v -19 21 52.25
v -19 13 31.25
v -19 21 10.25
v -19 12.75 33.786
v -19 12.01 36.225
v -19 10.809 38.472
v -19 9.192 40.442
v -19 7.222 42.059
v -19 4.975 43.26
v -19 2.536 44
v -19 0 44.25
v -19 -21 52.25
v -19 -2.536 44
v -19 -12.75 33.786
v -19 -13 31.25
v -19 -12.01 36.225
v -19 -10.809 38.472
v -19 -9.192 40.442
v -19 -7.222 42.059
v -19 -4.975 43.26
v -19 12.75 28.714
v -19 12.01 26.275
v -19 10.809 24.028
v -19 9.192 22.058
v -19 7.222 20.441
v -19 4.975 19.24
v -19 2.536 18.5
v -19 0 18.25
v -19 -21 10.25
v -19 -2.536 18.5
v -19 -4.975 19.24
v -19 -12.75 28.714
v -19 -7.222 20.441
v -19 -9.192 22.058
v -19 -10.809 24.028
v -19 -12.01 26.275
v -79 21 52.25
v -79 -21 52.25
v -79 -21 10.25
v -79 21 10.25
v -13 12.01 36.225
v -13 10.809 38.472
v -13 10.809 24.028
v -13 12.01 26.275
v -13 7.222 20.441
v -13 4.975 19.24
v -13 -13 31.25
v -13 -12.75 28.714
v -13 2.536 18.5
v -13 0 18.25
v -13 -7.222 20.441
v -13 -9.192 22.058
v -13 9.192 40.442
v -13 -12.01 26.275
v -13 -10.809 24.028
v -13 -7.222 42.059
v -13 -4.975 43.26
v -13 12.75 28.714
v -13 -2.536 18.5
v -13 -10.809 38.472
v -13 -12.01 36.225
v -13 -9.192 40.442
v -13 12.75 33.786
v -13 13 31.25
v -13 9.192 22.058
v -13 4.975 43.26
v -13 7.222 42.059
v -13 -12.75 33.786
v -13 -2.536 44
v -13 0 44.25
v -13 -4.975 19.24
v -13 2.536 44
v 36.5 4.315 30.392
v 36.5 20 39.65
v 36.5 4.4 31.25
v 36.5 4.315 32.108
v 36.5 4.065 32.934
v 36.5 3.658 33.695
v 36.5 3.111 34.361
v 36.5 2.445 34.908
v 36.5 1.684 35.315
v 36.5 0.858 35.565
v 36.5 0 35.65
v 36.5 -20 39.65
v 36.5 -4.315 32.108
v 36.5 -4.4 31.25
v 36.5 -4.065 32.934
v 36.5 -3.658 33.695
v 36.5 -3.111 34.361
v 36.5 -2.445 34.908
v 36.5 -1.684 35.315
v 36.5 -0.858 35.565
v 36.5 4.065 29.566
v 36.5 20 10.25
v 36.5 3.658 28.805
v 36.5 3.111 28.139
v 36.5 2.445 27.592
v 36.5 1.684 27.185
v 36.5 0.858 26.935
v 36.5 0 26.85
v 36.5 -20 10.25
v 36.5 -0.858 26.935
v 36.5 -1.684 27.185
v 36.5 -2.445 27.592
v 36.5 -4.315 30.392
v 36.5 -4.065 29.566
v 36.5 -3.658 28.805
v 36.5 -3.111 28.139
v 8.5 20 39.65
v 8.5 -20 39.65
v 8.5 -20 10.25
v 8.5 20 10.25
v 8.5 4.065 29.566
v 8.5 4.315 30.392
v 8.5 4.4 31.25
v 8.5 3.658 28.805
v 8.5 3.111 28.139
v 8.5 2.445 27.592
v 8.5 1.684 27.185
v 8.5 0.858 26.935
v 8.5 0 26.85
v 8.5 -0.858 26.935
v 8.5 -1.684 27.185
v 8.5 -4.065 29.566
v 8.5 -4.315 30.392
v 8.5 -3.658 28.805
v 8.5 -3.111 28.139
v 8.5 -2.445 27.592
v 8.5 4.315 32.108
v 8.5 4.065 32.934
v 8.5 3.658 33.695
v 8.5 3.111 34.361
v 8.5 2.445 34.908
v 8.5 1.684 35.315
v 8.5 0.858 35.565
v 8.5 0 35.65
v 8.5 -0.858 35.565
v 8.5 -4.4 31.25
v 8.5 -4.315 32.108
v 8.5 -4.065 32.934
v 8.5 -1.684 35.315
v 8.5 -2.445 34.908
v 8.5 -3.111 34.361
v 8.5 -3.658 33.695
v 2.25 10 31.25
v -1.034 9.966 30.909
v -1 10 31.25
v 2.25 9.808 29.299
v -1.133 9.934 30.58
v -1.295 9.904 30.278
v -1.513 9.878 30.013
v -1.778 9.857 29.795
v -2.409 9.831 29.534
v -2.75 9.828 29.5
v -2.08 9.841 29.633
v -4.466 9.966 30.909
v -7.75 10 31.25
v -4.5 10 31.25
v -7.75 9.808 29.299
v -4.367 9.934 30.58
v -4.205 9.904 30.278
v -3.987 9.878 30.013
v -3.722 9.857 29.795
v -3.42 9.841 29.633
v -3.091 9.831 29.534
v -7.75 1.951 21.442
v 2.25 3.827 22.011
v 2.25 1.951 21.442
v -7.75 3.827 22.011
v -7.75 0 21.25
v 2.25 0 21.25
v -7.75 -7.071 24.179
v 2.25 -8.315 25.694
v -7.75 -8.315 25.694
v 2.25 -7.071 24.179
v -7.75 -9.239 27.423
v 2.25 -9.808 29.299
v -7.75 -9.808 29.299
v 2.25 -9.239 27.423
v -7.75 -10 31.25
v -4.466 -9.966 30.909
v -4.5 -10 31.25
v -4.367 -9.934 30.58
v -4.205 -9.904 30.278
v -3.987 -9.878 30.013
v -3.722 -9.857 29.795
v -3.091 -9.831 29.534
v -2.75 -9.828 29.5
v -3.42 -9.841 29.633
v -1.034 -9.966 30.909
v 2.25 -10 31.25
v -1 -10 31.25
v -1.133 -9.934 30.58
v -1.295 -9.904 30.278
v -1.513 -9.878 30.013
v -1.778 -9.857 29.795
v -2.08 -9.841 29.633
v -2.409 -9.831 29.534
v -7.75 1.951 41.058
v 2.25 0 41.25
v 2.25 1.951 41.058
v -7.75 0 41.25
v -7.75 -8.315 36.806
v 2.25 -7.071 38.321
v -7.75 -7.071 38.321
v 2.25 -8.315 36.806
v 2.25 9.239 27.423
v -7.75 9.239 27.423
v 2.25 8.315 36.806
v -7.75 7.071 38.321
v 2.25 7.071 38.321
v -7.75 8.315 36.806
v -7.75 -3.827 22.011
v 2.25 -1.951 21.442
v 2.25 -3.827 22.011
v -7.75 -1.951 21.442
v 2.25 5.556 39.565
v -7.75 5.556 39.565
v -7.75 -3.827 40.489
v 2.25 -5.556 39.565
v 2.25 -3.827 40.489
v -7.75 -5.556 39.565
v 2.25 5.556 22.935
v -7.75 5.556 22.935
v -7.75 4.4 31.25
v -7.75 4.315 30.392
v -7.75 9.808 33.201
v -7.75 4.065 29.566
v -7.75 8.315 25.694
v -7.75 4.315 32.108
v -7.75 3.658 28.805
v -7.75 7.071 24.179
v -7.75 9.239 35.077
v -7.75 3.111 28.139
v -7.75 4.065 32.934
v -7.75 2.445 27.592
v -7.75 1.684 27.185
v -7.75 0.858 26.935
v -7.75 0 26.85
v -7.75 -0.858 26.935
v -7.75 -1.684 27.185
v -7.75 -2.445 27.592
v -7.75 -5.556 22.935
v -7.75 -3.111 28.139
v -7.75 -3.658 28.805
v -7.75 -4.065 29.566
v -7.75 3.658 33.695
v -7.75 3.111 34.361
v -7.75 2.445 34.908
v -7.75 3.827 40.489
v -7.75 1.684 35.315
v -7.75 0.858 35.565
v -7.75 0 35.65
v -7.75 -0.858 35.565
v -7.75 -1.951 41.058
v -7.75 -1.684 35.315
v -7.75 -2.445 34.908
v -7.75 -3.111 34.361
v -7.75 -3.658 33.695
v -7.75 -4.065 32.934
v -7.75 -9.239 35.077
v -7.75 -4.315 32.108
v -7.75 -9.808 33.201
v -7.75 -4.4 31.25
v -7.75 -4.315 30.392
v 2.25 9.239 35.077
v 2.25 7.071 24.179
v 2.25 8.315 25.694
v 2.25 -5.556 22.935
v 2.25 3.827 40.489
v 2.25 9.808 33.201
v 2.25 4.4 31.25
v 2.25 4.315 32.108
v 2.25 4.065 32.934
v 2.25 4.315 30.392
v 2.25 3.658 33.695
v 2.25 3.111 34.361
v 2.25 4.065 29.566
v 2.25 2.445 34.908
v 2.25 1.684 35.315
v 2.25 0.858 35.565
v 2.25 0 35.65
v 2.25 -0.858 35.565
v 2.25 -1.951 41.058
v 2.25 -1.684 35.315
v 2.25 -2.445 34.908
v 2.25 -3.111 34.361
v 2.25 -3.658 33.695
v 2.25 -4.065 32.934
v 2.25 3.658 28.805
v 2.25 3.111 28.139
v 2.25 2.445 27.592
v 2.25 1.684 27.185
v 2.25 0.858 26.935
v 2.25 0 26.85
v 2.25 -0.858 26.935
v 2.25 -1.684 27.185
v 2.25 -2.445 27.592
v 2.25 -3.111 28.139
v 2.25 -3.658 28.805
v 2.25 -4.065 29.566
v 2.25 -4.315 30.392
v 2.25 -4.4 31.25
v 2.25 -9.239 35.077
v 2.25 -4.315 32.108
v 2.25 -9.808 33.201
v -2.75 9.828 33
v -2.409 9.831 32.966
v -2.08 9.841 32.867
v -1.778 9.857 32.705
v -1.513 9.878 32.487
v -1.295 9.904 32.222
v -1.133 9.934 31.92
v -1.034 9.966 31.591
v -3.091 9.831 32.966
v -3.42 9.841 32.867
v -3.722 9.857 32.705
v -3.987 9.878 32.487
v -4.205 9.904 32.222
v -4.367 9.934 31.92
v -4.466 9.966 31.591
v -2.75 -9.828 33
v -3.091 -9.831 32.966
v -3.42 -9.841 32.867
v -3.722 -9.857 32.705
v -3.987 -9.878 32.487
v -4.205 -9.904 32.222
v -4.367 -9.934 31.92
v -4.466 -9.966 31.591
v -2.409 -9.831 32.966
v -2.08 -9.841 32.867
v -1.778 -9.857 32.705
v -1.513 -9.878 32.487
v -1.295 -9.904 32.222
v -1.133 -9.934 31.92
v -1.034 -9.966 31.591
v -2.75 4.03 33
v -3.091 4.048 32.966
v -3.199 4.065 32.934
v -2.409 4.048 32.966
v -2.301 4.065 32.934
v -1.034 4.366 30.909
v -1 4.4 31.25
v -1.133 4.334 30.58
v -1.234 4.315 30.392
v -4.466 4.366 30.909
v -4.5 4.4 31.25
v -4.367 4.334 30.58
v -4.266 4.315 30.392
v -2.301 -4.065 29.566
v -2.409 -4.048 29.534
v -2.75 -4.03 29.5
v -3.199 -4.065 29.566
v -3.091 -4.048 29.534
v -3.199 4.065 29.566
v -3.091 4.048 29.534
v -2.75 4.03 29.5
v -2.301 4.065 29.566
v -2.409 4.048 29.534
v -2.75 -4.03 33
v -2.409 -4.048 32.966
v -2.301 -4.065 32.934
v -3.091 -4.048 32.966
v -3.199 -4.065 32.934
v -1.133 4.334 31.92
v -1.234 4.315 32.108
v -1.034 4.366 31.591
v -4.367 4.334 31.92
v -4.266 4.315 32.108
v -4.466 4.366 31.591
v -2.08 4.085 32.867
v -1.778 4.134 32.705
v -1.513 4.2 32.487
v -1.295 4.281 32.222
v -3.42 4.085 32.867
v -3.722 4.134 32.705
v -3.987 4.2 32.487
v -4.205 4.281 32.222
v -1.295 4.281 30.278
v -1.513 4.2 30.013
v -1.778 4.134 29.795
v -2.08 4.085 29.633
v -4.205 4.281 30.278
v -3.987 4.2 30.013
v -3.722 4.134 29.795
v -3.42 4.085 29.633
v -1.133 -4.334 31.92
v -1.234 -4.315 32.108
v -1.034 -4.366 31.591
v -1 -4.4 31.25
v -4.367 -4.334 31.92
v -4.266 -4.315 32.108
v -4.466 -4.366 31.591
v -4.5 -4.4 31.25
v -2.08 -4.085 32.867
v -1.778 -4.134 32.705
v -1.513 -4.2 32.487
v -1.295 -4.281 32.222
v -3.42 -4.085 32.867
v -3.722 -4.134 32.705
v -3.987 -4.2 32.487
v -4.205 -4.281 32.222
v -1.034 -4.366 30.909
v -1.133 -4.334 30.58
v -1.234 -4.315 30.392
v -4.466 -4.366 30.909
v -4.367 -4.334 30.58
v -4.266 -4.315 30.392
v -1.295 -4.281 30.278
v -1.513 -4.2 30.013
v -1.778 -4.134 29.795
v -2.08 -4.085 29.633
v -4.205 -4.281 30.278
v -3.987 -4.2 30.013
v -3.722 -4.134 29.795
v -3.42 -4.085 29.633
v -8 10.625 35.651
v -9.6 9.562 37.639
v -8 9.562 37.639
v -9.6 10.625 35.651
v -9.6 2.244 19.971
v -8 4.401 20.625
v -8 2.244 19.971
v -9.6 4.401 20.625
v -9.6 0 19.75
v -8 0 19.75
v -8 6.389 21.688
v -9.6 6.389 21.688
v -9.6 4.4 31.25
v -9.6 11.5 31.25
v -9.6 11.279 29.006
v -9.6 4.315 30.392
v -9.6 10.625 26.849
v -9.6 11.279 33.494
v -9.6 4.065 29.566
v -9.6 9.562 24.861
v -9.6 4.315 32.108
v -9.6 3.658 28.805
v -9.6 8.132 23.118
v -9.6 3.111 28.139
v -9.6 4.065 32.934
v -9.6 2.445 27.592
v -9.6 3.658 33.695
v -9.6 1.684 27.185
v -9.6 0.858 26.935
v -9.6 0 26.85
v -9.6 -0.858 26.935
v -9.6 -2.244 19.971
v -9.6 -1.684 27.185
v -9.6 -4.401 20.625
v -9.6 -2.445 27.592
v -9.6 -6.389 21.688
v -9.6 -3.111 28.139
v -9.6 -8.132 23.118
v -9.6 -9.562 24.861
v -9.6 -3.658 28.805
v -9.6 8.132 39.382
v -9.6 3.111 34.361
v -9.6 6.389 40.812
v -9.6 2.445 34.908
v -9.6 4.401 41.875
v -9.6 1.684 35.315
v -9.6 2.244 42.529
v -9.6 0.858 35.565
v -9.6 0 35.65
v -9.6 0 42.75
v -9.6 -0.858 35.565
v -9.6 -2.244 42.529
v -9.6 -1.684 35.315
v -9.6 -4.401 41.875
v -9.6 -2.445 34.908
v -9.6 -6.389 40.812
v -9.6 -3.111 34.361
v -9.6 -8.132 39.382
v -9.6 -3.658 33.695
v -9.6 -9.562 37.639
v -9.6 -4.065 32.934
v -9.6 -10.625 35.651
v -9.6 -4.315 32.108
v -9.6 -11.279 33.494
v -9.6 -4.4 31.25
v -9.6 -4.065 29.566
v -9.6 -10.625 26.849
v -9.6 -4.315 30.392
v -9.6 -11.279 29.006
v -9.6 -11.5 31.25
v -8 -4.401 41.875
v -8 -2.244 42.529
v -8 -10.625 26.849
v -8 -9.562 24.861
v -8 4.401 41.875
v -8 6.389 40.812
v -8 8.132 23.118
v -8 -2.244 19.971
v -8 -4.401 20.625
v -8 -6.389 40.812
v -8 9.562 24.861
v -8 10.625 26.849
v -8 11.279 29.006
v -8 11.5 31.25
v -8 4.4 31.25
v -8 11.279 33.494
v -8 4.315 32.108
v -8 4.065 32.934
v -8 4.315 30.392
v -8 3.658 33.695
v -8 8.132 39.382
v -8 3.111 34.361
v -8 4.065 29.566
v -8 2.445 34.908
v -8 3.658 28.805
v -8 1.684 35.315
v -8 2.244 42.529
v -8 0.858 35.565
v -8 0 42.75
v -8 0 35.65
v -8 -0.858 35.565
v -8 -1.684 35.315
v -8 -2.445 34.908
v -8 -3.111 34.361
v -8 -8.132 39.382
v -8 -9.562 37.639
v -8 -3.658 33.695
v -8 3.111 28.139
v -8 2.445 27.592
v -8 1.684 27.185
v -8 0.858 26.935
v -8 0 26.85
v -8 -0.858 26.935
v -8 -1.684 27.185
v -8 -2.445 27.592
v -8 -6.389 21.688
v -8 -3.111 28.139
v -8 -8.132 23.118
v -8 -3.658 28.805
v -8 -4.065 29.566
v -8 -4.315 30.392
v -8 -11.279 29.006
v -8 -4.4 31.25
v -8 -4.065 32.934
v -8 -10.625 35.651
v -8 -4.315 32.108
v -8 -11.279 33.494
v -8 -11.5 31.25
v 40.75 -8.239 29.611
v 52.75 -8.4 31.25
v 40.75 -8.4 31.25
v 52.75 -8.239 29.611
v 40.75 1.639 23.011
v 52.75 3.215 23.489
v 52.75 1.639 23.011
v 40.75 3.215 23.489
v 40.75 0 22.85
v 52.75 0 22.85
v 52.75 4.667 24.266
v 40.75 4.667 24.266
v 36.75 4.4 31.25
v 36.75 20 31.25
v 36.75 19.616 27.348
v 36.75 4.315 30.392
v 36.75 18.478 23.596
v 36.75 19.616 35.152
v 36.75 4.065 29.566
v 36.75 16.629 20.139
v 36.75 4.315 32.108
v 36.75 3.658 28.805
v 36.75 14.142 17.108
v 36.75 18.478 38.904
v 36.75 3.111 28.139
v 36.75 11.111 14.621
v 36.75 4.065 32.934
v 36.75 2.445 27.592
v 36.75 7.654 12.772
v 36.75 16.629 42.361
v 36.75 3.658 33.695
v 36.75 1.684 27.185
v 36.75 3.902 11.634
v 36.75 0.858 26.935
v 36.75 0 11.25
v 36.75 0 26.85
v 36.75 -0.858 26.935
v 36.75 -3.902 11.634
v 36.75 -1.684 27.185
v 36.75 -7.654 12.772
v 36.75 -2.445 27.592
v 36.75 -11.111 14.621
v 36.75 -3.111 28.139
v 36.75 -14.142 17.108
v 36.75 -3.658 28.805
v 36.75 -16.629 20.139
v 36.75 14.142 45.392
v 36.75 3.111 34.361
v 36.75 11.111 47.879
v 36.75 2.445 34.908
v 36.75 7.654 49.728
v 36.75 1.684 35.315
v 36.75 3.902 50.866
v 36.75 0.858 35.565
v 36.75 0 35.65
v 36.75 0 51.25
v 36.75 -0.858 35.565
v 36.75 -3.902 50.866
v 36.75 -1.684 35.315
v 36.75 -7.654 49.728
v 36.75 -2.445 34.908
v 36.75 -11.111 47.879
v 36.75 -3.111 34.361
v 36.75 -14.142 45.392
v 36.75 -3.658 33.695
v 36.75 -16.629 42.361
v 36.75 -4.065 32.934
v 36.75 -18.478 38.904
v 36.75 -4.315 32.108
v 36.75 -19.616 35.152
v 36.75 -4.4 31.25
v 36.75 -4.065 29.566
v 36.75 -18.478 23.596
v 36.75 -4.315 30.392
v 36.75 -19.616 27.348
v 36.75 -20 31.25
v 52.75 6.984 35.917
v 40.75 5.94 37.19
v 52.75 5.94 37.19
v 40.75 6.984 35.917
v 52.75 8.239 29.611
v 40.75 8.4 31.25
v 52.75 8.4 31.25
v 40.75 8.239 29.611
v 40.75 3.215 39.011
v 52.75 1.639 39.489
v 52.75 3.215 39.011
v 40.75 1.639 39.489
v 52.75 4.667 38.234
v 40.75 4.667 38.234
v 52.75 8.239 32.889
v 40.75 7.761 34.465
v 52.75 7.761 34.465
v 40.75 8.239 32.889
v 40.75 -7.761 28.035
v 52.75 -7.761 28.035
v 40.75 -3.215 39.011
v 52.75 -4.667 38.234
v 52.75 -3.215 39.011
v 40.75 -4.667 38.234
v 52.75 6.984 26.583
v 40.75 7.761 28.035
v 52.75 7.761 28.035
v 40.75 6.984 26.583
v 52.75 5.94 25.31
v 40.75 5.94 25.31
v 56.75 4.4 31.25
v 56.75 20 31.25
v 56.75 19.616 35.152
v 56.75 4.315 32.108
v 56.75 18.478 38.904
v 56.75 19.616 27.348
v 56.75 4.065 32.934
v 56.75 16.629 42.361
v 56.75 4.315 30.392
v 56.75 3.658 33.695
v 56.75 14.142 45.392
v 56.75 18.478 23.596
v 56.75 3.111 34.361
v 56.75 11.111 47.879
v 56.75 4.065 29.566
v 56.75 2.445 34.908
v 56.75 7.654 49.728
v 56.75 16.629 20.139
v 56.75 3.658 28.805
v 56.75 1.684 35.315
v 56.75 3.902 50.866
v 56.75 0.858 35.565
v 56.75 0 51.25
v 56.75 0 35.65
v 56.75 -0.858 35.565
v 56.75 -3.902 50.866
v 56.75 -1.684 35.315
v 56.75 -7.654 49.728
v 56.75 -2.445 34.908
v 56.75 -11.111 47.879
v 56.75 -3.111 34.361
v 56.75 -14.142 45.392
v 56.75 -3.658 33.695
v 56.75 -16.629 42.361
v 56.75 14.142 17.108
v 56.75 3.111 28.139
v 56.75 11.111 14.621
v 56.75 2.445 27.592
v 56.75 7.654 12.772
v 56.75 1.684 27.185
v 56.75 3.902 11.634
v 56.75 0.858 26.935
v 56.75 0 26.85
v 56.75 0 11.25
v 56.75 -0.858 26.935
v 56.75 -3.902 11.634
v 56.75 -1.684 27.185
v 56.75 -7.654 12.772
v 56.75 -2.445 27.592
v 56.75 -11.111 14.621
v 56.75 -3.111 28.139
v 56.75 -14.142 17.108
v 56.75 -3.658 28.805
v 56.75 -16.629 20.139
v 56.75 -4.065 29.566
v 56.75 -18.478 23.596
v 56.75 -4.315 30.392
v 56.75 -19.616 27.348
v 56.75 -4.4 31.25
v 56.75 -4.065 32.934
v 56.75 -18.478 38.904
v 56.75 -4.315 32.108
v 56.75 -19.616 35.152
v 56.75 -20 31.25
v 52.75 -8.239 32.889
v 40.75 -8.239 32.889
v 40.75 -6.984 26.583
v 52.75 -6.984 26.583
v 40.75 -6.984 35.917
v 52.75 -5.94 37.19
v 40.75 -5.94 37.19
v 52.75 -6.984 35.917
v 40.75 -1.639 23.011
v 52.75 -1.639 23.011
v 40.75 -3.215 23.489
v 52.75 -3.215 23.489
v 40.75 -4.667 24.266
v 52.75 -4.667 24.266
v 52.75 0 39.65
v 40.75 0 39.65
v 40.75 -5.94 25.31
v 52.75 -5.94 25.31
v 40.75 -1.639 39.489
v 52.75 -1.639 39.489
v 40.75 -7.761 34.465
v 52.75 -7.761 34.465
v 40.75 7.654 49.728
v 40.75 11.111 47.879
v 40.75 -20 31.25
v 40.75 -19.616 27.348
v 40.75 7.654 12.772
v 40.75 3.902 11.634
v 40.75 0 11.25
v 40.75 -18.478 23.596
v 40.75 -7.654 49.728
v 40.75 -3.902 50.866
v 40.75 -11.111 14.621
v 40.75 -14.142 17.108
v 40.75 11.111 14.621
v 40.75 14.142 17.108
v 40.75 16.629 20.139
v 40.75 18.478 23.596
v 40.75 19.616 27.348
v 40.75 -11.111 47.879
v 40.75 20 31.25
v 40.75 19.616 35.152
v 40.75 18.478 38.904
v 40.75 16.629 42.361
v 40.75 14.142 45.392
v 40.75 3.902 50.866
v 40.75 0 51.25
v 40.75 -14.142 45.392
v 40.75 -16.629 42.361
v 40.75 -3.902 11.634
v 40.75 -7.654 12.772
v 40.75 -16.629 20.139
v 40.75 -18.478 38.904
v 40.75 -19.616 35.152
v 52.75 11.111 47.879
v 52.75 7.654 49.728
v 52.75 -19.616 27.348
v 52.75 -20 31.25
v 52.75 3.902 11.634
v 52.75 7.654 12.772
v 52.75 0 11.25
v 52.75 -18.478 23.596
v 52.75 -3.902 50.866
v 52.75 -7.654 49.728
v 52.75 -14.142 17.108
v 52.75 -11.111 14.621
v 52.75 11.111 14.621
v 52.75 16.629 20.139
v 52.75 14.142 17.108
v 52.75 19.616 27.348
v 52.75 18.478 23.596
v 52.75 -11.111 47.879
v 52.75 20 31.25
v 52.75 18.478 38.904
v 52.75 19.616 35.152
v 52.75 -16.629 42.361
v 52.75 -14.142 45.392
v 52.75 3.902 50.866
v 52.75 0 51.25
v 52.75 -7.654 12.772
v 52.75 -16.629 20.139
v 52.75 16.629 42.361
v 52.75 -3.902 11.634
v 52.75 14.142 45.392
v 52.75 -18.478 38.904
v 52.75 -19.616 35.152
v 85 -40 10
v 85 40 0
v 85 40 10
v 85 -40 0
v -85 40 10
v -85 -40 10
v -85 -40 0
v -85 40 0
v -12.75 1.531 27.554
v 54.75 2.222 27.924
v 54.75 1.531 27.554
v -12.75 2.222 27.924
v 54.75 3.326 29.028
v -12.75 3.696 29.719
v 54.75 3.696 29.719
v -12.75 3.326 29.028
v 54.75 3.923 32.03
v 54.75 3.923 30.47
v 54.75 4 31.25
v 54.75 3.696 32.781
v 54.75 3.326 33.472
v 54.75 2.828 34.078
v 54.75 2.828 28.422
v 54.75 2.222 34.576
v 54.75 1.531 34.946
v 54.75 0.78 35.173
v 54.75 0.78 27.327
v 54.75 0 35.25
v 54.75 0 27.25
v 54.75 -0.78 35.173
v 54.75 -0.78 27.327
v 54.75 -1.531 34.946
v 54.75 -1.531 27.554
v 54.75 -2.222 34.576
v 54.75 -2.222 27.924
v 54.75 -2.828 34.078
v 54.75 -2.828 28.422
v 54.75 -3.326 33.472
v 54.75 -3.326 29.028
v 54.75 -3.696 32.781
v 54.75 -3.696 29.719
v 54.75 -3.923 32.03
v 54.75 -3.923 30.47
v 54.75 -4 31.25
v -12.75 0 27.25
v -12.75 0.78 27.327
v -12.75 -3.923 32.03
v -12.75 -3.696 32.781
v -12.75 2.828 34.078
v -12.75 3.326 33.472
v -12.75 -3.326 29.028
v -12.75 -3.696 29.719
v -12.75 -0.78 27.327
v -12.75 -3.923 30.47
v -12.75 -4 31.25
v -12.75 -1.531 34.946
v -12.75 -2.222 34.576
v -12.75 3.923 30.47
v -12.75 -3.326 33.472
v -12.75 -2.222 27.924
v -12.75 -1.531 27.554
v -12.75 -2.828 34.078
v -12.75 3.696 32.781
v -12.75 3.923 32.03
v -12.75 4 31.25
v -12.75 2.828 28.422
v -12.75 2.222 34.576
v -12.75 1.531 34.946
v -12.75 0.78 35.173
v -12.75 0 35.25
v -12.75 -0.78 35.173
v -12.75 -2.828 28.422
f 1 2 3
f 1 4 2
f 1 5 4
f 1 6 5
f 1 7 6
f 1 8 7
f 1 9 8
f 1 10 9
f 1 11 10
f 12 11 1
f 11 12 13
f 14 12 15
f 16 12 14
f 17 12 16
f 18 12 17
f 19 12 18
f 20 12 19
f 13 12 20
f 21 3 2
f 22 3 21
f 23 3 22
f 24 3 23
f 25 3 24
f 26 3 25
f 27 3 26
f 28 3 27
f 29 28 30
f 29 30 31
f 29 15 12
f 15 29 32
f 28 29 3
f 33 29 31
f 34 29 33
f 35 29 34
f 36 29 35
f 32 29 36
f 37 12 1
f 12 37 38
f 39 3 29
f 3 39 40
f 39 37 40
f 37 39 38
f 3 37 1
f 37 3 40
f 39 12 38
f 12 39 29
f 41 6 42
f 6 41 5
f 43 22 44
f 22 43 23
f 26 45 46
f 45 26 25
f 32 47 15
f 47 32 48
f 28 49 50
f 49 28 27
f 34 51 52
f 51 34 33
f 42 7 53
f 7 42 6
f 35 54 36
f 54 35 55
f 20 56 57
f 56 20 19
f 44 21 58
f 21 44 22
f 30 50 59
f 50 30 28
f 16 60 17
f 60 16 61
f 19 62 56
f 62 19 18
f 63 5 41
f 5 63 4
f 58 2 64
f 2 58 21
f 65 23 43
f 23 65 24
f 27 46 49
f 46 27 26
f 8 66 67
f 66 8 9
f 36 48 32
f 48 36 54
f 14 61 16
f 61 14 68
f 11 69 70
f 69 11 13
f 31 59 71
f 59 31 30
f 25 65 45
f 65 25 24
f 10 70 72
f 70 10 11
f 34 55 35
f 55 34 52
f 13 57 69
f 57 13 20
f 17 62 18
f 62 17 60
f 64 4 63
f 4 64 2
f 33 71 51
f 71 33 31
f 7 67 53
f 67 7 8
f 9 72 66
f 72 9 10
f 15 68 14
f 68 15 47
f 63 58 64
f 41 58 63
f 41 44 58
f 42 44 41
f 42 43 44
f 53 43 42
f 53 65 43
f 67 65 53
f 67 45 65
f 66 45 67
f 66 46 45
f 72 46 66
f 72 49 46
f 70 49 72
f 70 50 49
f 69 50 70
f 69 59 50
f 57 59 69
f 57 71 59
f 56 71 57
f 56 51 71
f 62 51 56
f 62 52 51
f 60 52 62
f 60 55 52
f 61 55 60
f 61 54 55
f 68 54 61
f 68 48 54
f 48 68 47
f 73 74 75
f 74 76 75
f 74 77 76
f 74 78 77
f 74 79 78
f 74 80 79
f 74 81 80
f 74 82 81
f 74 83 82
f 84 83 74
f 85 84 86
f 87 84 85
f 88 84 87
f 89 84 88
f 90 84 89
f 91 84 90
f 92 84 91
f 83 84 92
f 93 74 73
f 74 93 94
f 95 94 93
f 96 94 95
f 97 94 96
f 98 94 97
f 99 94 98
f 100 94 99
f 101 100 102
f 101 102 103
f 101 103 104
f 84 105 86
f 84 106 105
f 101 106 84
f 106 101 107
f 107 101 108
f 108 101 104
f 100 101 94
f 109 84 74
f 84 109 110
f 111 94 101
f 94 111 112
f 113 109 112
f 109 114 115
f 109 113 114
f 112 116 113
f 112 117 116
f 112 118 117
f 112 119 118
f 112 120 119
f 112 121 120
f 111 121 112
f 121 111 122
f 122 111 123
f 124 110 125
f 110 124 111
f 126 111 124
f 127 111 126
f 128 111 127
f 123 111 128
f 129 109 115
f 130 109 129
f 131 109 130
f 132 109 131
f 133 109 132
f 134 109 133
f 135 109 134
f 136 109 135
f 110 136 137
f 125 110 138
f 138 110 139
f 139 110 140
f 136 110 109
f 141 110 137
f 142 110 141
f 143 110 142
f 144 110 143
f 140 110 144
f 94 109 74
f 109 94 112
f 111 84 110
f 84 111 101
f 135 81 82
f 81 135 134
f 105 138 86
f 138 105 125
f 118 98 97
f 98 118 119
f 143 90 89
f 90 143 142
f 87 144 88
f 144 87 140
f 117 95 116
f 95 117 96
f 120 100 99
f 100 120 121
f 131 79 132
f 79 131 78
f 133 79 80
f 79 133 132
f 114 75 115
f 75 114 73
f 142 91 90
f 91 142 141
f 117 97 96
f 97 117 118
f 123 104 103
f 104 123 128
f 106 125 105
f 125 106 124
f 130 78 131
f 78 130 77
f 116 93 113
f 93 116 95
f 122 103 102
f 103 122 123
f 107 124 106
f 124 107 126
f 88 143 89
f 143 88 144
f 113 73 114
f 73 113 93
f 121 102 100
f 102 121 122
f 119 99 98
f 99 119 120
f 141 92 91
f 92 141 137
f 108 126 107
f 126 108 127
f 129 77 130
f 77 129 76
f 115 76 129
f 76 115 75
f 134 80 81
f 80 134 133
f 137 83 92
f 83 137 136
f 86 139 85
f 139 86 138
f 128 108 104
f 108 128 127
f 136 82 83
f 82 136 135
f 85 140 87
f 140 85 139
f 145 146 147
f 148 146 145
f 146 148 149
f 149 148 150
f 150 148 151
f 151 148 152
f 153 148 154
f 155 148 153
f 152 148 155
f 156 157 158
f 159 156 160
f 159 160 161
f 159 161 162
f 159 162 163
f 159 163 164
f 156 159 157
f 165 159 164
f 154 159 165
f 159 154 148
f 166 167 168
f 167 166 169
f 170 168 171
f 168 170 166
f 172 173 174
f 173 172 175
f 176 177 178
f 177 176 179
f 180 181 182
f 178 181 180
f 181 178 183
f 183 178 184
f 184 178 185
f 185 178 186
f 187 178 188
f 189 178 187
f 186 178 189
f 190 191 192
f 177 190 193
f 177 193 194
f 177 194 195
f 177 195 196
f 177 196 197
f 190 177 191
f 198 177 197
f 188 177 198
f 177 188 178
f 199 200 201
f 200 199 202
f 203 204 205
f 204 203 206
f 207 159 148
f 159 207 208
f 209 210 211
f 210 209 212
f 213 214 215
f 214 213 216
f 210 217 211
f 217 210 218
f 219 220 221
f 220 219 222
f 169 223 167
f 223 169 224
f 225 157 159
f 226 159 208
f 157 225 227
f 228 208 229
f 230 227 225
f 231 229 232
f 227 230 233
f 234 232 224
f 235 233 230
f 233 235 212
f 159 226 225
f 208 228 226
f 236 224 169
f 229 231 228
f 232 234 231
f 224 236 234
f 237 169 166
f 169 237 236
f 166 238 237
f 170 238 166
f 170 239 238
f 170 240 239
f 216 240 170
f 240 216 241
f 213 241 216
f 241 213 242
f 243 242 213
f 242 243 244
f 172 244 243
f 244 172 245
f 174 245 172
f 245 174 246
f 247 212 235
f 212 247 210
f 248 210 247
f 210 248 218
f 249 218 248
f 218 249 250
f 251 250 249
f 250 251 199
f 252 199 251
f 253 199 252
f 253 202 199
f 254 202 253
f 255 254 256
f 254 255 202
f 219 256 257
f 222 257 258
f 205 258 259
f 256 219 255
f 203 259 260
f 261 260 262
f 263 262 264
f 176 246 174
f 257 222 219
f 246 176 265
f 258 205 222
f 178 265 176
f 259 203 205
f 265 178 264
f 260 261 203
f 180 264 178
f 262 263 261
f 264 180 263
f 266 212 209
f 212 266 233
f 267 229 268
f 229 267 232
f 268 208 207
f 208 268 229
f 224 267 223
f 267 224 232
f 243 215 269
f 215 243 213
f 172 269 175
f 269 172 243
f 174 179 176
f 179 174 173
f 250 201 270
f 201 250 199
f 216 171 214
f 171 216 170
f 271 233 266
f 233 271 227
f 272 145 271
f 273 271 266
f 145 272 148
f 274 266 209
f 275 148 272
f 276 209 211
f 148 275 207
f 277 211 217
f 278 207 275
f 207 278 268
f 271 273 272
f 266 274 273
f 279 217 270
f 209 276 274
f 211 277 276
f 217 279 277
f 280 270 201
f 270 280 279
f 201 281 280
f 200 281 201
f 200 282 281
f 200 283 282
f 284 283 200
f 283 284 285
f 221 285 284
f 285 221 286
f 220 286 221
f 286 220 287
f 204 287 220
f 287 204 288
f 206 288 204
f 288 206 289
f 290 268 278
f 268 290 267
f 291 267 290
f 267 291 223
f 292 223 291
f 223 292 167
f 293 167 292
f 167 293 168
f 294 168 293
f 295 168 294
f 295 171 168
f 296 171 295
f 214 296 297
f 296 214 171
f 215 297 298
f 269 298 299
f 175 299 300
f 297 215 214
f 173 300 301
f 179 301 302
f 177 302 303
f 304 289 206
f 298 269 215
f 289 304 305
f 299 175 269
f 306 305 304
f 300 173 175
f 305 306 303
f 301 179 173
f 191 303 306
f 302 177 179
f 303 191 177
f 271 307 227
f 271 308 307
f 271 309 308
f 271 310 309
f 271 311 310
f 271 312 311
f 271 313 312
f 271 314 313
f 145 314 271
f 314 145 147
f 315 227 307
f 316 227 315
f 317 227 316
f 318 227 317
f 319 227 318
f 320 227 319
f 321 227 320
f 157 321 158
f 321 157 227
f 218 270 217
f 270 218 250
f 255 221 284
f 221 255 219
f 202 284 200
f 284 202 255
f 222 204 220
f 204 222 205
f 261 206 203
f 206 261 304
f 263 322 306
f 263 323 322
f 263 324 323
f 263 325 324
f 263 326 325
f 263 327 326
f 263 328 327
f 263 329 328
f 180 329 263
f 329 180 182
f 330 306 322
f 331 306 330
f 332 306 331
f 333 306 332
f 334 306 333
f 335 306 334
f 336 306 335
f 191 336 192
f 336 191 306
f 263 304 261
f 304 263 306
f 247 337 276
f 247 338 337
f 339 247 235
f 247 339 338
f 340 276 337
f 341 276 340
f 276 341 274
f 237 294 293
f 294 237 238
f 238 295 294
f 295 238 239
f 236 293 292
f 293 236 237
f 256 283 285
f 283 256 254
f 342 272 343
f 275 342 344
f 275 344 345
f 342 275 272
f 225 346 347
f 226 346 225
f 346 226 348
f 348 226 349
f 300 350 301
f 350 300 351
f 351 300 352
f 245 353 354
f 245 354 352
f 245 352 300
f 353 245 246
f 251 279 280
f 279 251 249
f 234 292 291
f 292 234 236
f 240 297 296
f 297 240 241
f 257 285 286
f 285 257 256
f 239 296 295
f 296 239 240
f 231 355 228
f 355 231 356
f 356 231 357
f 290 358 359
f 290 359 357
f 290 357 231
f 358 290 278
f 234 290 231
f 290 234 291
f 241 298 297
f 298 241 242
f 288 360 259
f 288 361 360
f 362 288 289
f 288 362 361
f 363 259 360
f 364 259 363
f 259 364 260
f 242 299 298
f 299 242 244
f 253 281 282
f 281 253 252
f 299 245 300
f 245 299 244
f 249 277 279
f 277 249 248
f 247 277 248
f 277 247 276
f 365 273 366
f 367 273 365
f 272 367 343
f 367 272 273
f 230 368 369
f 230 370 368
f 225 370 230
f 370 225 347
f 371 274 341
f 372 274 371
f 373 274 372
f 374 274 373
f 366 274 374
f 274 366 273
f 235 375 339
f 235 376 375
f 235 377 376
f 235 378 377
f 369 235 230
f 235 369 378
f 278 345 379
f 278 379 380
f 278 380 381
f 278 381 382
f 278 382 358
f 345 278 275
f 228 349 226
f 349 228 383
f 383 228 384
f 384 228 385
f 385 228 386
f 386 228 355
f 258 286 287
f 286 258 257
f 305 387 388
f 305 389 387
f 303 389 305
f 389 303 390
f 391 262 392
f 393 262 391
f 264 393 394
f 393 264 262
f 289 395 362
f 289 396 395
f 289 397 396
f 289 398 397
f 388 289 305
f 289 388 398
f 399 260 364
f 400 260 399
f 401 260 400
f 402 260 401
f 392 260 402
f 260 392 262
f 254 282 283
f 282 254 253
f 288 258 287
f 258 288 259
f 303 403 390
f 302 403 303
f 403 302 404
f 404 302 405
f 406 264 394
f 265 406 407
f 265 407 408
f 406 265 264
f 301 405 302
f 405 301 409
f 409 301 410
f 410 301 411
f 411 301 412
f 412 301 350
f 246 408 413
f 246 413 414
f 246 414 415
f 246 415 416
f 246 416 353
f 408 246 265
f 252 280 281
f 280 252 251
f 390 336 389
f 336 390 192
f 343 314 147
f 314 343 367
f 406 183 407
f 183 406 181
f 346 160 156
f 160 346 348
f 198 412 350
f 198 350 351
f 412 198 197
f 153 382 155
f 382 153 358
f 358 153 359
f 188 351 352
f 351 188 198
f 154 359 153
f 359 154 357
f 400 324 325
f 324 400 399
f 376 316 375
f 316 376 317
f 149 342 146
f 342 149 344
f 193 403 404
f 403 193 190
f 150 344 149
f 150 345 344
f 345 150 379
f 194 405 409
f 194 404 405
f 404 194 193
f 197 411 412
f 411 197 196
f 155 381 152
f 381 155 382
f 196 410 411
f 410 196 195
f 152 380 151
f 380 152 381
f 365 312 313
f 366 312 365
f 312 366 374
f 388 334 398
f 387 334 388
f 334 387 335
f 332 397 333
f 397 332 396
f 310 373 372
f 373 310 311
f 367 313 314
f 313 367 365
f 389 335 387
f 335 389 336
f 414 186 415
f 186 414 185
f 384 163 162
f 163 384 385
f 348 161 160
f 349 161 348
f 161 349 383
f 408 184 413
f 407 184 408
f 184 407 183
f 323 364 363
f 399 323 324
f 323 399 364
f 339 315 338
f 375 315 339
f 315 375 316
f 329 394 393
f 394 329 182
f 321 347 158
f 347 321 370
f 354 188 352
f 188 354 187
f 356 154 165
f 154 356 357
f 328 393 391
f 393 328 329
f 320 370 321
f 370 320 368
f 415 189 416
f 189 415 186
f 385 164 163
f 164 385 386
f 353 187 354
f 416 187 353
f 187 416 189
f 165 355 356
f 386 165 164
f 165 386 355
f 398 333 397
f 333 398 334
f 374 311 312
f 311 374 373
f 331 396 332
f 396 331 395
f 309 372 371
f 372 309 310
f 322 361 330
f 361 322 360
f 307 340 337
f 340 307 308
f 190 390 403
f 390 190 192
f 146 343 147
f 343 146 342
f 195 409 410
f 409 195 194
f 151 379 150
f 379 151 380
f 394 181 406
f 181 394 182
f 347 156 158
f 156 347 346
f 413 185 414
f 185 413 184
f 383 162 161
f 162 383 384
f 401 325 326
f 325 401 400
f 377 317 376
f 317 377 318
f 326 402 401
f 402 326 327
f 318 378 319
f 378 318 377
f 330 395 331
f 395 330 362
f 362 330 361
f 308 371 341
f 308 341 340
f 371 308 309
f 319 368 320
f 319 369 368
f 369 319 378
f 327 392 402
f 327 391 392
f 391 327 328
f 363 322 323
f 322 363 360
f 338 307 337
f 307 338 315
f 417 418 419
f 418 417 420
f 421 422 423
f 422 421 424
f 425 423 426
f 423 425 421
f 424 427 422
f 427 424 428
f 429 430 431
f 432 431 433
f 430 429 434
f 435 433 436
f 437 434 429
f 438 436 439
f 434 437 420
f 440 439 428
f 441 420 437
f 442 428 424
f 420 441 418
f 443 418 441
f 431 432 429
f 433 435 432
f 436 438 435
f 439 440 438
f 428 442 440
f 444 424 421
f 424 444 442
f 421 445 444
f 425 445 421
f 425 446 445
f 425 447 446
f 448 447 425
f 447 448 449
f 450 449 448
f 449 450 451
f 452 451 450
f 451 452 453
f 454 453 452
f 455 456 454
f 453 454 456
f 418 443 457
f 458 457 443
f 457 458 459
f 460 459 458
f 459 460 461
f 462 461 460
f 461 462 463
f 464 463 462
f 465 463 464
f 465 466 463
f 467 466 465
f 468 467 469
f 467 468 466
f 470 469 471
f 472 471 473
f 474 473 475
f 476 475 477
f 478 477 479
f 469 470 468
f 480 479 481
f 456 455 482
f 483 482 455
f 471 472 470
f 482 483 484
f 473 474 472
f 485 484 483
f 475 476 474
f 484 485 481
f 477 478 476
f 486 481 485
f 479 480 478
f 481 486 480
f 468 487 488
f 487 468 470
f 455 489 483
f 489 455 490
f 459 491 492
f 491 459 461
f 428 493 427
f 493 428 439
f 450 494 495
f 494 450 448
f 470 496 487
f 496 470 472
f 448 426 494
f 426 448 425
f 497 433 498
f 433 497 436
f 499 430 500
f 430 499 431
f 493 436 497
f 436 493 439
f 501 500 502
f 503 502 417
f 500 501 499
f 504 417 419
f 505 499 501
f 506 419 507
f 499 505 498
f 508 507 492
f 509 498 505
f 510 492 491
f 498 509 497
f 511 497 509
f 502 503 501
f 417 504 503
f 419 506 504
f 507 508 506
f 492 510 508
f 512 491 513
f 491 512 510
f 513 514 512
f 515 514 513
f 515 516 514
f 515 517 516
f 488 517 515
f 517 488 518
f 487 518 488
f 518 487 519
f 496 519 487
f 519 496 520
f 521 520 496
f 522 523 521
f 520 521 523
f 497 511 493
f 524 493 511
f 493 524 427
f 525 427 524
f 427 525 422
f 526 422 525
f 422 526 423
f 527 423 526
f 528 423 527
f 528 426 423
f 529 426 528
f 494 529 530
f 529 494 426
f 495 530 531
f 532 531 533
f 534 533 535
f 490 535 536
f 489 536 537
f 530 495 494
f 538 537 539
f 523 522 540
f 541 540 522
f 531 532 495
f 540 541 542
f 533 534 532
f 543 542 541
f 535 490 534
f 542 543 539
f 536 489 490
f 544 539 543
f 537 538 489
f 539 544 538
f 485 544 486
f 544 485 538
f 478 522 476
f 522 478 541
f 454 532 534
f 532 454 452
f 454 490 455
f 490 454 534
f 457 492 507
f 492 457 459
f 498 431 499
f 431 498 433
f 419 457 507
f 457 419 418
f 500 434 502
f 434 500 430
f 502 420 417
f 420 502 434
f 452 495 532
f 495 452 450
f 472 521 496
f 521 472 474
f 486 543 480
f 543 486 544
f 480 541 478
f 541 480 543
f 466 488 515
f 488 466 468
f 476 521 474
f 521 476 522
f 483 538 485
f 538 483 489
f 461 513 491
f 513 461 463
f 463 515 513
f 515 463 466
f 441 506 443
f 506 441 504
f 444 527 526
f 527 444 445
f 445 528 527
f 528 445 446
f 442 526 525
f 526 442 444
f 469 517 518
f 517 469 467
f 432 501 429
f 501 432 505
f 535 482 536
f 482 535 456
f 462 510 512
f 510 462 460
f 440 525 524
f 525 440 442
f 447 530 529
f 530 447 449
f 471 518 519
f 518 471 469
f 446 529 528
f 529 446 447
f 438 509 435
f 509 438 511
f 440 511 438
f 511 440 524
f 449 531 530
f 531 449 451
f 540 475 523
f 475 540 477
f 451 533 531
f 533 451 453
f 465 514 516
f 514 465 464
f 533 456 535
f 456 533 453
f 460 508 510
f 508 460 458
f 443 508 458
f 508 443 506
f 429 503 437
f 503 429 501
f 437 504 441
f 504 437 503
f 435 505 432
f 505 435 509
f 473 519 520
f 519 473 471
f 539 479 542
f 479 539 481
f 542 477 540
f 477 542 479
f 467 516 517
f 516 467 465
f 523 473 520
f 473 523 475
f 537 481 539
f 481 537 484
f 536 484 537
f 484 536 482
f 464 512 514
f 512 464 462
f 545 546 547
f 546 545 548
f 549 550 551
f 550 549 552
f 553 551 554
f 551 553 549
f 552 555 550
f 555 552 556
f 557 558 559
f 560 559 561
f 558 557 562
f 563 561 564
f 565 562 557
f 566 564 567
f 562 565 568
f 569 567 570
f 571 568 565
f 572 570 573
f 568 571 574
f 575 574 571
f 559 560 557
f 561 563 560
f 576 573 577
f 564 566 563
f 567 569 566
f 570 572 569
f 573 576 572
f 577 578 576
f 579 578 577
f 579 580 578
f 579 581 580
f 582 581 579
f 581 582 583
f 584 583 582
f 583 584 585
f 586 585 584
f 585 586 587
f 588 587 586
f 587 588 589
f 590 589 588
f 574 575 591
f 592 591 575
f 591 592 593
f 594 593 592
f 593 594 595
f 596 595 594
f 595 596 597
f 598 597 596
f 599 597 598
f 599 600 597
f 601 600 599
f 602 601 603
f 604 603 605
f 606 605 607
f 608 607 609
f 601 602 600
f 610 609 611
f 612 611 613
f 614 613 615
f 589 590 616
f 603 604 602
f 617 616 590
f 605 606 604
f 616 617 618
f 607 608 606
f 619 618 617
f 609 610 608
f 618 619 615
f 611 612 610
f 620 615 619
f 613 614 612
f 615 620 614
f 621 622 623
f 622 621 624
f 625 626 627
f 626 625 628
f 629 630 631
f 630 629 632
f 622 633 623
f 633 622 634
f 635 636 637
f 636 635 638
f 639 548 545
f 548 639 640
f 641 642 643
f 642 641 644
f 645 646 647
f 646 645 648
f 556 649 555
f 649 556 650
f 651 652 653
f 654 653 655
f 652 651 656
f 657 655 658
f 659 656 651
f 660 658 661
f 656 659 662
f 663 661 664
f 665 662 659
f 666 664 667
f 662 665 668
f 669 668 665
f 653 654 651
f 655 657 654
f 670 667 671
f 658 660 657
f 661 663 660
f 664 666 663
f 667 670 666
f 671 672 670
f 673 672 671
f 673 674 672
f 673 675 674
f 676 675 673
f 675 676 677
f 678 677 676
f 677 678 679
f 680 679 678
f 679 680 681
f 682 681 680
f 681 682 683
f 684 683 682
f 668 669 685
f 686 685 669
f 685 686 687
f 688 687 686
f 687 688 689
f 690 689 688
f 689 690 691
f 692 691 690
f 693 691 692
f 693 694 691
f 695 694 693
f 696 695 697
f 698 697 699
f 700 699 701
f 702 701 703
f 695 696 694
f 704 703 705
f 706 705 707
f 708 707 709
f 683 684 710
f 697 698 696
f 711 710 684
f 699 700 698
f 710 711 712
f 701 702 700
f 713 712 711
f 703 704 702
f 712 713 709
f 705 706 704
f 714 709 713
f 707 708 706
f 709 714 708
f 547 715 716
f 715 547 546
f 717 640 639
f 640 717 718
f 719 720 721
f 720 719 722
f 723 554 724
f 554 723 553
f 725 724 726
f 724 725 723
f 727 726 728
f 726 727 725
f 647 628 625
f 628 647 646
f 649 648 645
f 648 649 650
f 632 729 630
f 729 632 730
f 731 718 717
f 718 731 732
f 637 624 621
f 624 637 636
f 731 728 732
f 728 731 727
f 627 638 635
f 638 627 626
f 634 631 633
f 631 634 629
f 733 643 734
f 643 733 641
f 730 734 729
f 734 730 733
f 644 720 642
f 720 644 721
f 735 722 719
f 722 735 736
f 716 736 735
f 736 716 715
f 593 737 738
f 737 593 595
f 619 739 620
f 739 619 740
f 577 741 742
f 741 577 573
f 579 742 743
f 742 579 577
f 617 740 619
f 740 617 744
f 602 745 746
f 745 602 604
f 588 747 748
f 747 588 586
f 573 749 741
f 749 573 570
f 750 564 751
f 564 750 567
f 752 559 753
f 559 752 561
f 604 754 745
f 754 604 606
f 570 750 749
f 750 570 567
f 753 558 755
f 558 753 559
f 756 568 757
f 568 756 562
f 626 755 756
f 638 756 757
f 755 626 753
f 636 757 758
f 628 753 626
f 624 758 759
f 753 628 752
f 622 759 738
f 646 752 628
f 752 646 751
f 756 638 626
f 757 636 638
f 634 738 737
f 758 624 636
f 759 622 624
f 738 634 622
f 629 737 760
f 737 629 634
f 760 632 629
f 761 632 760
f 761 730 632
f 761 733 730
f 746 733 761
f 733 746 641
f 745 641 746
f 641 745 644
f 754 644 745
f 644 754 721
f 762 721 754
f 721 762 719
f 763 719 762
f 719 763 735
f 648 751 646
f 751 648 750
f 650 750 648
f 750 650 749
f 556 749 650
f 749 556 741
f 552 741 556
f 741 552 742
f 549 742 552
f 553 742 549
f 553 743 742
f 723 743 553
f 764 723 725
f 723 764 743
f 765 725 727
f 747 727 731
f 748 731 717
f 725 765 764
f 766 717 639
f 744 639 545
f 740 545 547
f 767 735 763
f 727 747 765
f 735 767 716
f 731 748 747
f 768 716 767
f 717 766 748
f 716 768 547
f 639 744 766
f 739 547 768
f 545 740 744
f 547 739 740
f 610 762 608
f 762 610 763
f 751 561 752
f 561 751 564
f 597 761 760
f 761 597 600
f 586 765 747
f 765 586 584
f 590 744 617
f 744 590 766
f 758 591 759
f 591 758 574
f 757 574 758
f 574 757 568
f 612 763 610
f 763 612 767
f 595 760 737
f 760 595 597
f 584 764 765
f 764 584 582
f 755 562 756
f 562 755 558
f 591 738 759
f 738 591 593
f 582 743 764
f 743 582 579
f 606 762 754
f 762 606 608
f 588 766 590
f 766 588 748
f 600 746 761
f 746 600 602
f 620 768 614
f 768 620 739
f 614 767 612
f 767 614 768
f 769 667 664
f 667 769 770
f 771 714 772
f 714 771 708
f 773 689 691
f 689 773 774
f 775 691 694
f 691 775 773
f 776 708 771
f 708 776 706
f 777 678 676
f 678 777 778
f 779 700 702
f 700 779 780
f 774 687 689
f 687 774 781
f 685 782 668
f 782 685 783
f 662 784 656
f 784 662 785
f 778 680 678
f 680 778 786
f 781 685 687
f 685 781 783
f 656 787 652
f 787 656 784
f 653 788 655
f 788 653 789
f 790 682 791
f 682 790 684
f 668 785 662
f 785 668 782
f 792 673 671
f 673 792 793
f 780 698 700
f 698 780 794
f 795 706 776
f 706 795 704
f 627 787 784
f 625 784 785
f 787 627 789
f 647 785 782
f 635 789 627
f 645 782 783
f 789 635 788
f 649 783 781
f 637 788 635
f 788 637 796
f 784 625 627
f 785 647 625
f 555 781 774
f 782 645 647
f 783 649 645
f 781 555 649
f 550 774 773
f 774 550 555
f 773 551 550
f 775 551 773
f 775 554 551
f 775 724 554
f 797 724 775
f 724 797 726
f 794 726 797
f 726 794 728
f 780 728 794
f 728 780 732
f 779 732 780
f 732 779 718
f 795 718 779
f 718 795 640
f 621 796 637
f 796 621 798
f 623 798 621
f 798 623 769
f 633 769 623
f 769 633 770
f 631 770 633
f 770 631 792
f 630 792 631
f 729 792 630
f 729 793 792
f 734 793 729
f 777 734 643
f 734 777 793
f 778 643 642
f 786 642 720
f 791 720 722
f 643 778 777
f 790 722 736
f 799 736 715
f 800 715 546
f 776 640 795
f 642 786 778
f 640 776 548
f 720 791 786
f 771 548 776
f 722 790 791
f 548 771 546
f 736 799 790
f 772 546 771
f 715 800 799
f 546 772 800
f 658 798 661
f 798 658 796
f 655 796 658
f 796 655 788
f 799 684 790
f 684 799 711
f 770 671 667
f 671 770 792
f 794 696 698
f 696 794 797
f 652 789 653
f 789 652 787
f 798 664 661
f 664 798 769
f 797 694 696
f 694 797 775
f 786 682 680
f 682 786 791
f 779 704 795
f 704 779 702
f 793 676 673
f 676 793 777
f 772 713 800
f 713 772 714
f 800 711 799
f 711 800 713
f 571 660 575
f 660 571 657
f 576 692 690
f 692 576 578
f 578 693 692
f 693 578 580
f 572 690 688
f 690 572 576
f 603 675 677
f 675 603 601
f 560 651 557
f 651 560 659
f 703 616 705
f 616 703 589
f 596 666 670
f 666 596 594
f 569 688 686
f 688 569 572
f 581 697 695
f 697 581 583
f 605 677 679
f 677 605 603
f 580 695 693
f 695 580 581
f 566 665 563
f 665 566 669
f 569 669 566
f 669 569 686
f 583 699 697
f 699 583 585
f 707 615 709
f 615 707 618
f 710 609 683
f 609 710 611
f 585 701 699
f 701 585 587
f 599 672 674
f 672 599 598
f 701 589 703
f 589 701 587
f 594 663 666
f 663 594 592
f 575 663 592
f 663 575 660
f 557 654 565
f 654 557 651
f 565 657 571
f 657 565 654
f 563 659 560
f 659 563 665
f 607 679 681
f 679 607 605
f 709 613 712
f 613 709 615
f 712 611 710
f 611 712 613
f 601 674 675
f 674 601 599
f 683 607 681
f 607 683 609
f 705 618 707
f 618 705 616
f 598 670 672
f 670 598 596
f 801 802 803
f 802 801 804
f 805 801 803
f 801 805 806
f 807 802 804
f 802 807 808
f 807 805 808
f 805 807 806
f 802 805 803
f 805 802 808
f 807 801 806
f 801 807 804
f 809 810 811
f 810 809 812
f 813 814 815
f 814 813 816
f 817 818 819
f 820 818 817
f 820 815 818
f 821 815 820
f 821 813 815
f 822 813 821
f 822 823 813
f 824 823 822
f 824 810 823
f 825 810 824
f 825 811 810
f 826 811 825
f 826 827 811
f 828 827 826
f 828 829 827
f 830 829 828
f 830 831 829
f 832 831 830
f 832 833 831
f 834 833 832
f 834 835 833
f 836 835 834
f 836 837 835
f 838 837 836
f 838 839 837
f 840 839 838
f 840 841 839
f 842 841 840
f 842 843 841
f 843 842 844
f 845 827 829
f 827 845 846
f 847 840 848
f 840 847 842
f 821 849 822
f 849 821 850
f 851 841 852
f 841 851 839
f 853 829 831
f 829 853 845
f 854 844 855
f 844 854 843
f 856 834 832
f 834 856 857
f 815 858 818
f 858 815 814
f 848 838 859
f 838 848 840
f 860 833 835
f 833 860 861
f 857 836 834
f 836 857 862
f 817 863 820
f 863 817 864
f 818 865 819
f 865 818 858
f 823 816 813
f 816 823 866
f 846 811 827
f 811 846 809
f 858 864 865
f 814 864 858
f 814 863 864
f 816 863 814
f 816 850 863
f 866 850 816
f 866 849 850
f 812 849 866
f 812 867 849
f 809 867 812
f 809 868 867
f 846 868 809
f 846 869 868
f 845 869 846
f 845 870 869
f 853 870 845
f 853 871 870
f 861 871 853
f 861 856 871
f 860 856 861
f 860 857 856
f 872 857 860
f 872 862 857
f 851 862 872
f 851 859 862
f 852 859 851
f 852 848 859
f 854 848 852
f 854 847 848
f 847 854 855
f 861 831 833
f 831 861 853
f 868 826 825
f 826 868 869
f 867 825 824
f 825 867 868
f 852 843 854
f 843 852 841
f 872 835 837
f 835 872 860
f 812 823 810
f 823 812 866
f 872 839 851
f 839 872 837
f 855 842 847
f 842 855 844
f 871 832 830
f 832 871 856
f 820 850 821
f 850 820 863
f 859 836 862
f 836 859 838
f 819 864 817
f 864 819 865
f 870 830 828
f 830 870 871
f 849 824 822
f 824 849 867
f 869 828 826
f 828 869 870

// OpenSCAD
$fn = 32;

// ------------------------------------------------------------------------
// Motor drive station: motor 60 x 42 mm, shaft d8, pulley d40
// Every part is its own module, assembly() places every instance.
// ------------------------------------------------------------------------

// --- part 1 ---
module station_bed() {
  difference() {
    translate([-85, -40, 0]) cube([170, 80, 10]);
  }
}

// --- part 2 ---
module drive_motor() {
  union() {
    translate([-30, -21, 0]) cube([60, 42, 42]);
    translate([33, 0, 21]) rotate([0, 90, 0]) cylinder(h = 6, d = 26, center = true);
  }
}

// --- part 3 ---
module pillow_block() {
  difference() {
    translate([-14, -20, 0]) cube([28, 40, 29.4]);
    translate([0, 0, 21]) rotate([0, 90, 0]) cylinder(h = 30, d = 8.8, center = true);
  }
}

// --- part 4 ---
module drive_shaft() {
  translate([0, 0, -33.75]) cylinder(h = 67.5, d = 8);
}

// --- part 5 ---
module shaft_collar() {
  difference() {
    cylinder(h = 10, d = 20);
    translate([0, 0, -1]) cylinder(h = 12, d = 8.8);
    translate([0, 0, 5]) rotate([90, 0, 0]) cylinder(h = 22, d = 3.5, center = true);
  }
}

// --- part 6 ---
module collar_washer() {
  difference() {
      translate([0, 0, 0]) cylinder(h = 1.6, d = 23);
      translate([0, 0, -1]) cylinder(h = 3.6, d = 8.8);
    }
}

// --- part 7 ---
module drive_pulley() {
  difference() {
    union() {
      cylinder(h = 20, d = 16.8);
      cylinder(h = 4, d = 40);
      translate([0, 0, 16]) cylinder(h = 4, d = 40);
    }
    translate([0, 0, -1]) cylinder(h = 22, d = 8.8);
  }
}

// --- assembly ---
module assembly() {
  color([0.80, 0.24, 0.20]) translate([0, 0, 0]) rotate([0, 0, 0]) station_bed();
  color([0.20, 0.45, 0.75]) translate([-49, 0, 10.25]) rotate([0, 0, 0]) drive_motor();
  color([0.25, 0.62, 0.32]) translate([22.5, 0, 10.25]) rotate([0, 0, 0]) pillow_block();
  color([0.92, 0.70, 0.18]) translate([21, 0, 31.25]) rotate([0, 90, 0]) drive_shaft();
  color([0.58, 0.35, 0.70]) translate([-7.75, 0, 31.25]) rotate([0, 90, 0]) shaft_collar();
  color([0.16, 0.66, 0.66]) translate([-9.6, 0, 31.25]) rotate([0, 90, 0]) collar_washer();
  color([0.85, 0.48, 0.18]) translate([36.75, 0, 31.25]) rotate([0, 90, 0]) drive_pulley();
}

assembly();
